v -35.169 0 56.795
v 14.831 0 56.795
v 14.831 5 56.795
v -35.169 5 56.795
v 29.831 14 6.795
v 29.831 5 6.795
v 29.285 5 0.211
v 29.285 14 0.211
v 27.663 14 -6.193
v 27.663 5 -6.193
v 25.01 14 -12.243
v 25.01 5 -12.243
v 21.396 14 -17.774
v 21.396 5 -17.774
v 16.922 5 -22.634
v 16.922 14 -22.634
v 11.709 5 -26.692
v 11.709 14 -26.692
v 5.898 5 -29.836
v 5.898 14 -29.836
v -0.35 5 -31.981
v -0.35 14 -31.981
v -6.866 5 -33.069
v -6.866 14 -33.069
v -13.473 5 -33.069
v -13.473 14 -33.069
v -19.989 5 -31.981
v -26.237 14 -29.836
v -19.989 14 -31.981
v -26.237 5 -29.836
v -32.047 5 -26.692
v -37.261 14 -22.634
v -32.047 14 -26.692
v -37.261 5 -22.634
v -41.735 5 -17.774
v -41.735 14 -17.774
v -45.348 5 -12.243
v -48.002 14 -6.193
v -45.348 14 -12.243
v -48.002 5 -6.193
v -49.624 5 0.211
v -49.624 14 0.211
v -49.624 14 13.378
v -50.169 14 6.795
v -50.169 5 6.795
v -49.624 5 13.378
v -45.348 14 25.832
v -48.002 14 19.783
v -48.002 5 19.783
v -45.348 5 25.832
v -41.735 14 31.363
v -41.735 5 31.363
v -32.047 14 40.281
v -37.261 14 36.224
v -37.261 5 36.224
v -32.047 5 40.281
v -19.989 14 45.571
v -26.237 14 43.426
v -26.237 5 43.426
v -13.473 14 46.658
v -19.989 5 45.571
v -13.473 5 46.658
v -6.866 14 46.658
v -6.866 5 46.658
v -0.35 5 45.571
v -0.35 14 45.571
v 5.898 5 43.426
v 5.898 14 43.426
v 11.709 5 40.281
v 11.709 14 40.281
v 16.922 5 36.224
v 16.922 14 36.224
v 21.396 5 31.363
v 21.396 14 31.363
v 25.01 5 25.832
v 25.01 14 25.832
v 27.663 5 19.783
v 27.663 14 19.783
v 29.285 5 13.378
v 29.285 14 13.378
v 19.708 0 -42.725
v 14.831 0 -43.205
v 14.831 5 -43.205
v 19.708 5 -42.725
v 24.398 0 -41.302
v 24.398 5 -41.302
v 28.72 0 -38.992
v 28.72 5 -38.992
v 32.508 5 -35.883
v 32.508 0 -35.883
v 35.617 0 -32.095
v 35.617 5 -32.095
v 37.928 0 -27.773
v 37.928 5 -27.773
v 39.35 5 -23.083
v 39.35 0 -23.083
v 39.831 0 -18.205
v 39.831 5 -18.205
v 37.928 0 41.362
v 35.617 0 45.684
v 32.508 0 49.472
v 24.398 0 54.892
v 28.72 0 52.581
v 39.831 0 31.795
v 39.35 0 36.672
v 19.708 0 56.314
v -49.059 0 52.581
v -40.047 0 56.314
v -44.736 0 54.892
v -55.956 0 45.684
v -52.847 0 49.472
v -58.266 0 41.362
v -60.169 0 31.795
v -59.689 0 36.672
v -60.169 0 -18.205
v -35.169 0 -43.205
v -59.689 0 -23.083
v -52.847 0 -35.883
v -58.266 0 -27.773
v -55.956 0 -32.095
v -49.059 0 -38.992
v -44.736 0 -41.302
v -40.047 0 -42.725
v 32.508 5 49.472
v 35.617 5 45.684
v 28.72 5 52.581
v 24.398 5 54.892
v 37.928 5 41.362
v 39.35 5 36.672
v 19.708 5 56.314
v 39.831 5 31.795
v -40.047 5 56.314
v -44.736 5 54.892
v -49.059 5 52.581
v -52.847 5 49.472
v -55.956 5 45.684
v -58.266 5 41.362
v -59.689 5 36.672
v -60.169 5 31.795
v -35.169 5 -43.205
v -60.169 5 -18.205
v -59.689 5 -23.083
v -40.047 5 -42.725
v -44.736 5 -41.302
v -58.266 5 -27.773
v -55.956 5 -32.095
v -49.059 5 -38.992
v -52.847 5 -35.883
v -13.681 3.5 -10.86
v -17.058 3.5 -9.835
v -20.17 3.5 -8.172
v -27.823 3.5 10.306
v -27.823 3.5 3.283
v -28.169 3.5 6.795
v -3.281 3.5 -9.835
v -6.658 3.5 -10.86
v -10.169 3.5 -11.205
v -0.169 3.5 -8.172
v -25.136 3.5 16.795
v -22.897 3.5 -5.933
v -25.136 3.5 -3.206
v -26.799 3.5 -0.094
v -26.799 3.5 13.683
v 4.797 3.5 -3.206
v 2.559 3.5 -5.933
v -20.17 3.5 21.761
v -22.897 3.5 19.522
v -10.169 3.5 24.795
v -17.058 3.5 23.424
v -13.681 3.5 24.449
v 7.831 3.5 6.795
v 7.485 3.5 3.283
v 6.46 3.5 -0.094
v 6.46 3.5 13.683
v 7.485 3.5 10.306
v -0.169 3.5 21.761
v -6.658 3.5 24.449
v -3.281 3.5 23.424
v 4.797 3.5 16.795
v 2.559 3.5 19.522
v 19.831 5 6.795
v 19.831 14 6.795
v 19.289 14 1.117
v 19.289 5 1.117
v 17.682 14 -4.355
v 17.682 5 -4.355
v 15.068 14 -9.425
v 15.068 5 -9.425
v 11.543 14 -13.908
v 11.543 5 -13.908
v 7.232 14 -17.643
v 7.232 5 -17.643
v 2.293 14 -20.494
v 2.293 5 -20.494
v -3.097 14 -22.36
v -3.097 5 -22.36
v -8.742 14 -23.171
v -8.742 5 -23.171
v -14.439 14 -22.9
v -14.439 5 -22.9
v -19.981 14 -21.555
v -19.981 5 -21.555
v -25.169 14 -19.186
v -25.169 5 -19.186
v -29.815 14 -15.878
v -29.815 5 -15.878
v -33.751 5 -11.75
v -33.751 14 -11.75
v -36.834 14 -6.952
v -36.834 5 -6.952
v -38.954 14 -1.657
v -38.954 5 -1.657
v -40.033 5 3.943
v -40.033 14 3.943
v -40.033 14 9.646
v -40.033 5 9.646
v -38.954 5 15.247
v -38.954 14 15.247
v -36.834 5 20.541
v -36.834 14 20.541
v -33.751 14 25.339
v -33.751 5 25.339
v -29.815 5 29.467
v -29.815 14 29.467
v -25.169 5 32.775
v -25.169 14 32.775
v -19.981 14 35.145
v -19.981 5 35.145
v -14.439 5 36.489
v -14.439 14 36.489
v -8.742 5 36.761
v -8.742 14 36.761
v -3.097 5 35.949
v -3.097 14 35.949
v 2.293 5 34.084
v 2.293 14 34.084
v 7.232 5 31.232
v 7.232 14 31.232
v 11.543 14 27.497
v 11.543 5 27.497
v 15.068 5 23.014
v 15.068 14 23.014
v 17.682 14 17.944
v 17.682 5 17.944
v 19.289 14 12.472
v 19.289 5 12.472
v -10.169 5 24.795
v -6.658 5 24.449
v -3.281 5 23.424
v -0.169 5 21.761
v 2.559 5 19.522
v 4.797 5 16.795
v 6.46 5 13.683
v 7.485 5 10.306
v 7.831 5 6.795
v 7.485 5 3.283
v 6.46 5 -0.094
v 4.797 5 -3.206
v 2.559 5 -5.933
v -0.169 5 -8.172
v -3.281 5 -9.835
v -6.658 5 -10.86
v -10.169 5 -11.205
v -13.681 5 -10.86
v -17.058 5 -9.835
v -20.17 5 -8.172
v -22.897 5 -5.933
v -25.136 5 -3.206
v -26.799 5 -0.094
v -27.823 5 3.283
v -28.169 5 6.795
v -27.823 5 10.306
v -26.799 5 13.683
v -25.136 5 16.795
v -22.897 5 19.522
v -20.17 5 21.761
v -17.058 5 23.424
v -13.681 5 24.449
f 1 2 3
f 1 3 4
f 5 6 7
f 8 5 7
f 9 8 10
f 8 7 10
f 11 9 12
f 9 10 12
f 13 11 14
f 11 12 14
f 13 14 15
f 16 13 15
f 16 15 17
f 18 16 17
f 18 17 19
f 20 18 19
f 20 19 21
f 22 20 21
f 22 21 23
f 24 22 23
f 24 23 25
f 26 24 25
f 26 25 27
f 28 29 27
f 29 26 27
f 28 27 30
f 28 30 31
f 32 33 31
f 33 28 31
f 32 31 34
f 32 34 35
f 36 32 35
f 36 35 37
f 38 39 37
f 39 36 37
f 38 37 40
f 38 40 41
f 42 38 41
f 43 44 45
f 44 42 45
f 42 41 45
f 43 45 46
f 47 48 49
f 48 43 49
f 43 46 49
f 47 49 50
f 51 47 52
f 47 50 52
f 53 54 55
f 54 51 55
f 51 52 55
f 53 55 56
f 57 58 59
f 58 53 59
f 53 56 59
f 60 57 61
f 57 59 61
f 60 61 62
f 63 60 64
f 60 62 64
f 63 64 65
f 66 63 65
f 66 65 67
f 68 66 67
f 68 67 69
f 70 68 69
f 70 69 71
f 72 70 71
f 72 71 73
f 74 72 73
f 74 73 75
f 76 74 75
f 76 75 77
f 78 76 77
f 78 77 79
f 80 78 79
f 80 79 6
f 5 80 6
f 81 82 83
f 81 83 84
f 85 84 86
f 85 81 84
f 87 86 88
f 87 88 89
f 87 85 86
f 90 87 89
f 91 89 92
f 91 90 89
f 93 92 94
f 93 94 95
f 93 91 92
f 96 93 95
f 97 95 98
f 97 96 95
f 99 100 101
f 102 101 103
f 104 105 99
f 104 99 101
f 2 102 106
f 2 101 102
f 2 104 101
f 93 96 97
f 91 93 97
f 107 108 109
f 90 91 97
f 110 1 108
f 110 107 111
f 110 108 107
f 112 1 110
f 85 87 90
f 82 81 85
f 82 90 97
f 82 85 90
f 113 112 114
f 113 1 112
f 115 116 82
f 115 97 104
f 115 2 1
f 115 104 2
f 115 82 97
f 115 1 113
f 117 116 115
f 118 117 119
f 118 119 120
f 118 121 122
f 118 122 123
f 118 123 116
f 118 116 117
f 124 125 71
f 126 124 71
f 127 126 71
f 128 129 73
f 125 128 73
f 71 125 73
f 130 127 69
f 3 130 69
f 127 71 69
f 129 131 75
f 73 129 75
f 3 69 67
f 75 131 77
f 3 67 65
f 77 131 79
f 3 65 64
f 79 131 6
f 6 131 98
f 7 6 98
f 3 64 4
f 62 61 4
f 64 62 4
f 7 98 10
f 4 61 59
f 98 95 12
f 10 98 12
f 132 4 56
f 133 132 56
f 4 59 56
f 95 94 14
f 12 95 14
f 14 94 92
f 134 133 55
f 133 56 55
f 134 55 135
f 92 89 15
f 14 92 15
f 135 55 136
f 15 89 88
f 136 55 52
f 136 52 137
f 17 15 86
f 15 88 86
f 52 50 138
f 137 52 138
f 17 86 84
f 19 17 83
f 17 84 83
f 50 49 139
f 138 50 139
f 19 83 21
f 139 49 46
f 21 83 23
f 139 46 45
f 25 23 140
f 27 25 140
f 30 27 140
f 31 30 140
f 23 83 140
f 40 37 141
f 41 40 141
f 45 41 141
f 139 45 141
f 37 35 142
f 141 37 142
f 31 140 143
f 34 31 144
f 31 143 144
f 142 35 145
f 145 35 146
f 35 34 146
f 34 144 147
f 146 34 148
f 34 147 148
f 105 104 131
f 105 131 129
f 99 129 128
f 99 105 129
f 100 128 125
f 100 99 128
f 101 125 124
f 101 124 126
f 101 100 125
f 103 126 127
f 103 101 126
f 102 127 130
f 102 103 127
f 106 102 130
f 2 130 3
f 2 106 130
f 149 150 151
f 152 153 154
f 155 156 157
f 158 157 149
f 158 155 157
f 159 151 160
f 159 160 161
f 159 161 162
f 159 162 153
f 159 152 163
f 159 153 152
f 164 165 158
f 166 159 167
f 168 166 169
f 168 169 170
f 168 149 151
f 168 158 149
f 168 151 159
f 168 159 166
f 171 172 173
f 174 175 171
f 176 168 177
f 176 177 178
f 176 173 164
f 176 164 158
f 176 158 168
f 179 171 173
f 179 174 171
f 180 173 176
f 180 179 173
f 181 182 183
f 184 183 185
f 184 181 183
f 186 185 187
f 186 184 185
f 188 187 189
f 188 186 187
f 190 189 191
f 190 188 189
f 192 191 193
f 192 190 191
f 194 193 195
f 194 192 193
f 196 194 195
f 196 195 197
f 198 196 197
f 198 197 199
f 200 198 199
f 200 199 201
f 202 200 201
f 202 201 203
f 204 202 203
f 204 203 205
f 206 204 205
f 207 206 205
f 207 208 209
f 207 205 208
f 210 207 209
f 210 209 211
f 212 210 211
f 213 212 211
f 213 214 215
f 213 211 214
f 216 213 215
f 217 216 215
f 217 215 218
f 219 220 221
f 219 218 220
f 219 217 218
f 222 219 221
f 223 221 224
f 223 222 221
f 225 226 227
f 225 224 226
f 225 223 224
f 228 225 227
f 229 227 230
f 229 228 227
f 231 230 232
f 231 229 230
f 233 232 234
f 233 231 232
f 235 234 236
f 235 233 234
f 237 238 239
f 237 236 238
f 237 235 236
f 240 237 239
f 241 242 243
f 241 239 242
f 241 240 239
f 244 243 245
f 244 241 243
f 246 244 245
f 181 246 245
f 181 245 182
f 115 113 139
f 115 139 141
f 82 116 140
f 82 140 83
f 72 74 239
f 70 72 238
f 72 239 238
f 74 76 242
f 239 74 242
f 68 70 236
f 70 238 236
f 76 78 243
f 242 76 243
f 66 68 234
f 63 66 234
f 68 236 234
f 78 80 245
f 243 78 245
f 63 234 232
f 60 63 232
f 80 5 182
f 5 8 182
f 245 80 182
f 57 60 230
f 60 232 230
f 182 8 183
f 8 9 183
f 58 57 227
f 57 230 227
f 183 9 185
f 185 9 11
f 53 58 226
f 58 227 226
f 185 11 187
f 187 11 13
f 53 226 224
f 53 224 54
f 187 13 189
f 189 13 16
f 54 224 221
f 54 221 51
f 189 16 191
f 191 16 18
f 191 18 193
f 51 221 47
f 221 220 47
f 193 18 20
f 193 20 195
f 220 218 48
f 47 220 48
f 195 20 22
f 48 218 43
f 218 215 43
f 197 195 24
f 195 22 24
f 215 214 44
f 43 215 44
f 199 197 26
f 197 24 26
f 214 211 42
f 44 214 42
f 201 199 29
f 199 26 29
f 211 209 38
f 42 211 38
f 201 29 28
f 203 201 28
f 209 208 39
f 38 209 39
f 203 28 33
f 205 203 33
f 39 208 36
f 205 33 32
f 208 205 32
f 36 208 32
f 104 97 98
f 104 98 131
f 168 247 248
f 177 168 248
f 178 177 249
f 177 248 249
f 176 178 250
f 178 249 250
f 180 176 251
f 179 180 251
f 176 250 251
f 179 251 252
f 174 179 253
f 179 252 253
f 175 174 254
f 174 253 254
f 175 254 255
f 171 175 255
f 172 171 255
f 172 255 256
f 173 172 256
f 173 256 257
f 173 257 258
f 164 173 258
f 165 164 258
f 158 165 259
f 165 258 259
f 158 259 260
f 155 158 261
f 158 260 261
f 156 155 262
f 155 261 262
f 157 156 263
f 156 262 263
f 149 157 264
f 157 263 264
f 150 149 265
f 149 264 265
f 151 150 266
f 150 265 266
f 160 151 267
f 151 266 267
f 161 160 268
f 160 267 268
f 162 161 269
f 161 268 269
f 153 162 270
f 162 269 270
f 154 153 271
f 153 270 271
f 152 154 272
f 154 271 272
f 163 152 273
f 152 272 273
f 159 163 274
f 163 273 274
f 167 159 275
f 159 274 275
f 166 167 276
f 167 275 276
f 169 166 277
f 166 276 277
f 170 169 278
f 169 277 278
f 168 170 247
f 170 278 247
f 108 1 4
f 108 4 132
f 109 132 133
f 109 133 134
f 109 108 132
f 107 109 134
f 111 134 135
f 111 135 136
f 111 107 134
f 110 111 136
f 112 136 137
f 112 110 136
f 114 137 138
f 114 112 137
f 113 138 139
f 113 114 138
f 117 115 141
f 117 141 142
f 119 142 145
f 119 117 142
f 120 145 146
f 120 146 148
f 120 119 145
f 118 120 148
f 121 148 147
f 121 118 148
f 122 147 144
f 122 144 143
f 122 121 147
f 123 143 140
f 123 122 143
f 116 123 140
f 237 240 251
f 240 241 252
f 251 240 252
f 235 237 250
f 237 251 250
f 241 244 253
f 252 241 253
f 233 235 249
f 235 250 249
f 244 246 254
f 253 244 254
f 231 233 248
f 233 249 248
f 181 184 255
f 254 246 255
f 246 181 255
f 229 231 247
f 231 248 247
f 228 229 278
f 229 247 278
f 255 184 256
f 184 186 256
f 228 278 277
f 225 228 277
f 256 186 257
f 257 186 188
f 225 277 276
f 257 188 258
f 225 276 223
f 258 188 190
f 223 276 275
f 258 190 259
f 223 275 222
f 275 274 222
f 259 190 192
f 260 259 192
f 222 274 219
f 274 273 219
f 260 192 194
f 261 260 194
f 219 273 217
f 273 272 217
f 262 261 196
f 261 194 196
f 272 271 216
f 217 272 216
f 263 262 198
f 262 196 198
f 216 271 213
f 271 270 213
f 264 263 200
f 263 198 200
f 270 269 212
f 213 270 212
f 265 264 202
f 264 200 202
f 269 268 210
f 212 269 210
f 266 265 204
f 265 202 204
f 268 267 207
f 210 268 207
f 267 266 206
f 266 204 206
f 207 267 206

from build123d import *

# Parameters (mm, degrees)
RESSALTO_EXTRUS_O1_DEPTH = 5
ESBO_O2_R                = 40
ESBO_O2_R_2              = 30
EXTRUS_O_FINA1_DEPTH     = 18
ESBO_O7_R                = 18
CORTE_EXTRUS_O2_DEPTH    = 1.5
CORTE_EXTRUS_O9_DEPTH    = 128.5


with BuildPart() as part:
    # Esboço1 → Ressalto-extrusão1 (new body)
    with BuildSketch(Plane(origin=(0, 0, 0), x_dir=(1, 0, 0), z_dir=(0, 1, 0))):
        with BuildLine():
            Line((-35.169337018, 43.205430296), (14.830662982, 43.205430296))
            ThreePointArc((14.830662982, 43.205430296), (32.508332512, 35.883099826), (39.830662982, 18.205430296))
            Line((39.830662982, 18.205430296), (39.830662982, -31.794569704))
            ThreePointArc((39.830662982, -31.794569704), (32.508332512, -49.472239233), (14.830662982, -56.794569704))
            Line((14.830662982, -56.794569704), (-35.169337018, -56.794569704))
            ThreePointArc((-35.169337018, -56.794569704), (-52.847006547, -49.472239233), (-60.169337018, -31.794569704))
            Line((-60.169337018, -31.794569704), (-60.169337018, 18.205430296))
            ThreePointArc((-60.169337018, 18.205430296), (-52.847006547, 35.883099826), (-35.169337018, 43.205430296))
        make_face()
    extrude(amount=RESSALTO_EXTRUS_O1_DEPTH)

    # Esboço2 → Extrusão-Fina1 (add)
    with BuildSketch(Plane(origin=(0, 5, 0), x_dir=(1, 0, 0), z_dir=(0, 1, 0))):
        with Locations((-10.169337018, -6.794569704)):
            Circle(ESBO_O2_R)
        with Locations((-10.169337018, -6.794569704)):
            Circle(ESBO_O2_R_2, mode=Mode.SUBTRACT)
    extrude(amount=EXTRUS_O_FINA1_DEPTH)

    # Esboço7 → Corte-extrusão2 (cut)
    with BuildSketch(Plane(origin=(0, 5, 0), x_dir=(1, 0, 0), z_dir=(0, 1, 0))):
        with Locations(Location((-10.169337018, -6.794569704, 0), (0, 0, 270))):
            Circle(ESBO_O7_R)
    extrude(amount=-CORTE_EXTRUS_O2_DEPTH, mode=Mode.SUBTRACT)

    # Esboço16 → Corte-extrusão9 (cut)
    with BuildSketch(Plane(origin=(0, 0, -43.205430296), x_dir=(-1, 0, 0), z_dir=(0, 0, -1))):
        Polygon((-29.830662982, 14), (64.710384206, 14), (64.710384206, 40.871723048), (-29.830662982, 40.871723048), (-67.520218161, 40.871723048), (-67.520218161, 14), align=None)
    extrude(amount=-CORTE_EXTRUS_O9_DEPTH, mode=Mode.SUBTRACT)


solid = part.part
